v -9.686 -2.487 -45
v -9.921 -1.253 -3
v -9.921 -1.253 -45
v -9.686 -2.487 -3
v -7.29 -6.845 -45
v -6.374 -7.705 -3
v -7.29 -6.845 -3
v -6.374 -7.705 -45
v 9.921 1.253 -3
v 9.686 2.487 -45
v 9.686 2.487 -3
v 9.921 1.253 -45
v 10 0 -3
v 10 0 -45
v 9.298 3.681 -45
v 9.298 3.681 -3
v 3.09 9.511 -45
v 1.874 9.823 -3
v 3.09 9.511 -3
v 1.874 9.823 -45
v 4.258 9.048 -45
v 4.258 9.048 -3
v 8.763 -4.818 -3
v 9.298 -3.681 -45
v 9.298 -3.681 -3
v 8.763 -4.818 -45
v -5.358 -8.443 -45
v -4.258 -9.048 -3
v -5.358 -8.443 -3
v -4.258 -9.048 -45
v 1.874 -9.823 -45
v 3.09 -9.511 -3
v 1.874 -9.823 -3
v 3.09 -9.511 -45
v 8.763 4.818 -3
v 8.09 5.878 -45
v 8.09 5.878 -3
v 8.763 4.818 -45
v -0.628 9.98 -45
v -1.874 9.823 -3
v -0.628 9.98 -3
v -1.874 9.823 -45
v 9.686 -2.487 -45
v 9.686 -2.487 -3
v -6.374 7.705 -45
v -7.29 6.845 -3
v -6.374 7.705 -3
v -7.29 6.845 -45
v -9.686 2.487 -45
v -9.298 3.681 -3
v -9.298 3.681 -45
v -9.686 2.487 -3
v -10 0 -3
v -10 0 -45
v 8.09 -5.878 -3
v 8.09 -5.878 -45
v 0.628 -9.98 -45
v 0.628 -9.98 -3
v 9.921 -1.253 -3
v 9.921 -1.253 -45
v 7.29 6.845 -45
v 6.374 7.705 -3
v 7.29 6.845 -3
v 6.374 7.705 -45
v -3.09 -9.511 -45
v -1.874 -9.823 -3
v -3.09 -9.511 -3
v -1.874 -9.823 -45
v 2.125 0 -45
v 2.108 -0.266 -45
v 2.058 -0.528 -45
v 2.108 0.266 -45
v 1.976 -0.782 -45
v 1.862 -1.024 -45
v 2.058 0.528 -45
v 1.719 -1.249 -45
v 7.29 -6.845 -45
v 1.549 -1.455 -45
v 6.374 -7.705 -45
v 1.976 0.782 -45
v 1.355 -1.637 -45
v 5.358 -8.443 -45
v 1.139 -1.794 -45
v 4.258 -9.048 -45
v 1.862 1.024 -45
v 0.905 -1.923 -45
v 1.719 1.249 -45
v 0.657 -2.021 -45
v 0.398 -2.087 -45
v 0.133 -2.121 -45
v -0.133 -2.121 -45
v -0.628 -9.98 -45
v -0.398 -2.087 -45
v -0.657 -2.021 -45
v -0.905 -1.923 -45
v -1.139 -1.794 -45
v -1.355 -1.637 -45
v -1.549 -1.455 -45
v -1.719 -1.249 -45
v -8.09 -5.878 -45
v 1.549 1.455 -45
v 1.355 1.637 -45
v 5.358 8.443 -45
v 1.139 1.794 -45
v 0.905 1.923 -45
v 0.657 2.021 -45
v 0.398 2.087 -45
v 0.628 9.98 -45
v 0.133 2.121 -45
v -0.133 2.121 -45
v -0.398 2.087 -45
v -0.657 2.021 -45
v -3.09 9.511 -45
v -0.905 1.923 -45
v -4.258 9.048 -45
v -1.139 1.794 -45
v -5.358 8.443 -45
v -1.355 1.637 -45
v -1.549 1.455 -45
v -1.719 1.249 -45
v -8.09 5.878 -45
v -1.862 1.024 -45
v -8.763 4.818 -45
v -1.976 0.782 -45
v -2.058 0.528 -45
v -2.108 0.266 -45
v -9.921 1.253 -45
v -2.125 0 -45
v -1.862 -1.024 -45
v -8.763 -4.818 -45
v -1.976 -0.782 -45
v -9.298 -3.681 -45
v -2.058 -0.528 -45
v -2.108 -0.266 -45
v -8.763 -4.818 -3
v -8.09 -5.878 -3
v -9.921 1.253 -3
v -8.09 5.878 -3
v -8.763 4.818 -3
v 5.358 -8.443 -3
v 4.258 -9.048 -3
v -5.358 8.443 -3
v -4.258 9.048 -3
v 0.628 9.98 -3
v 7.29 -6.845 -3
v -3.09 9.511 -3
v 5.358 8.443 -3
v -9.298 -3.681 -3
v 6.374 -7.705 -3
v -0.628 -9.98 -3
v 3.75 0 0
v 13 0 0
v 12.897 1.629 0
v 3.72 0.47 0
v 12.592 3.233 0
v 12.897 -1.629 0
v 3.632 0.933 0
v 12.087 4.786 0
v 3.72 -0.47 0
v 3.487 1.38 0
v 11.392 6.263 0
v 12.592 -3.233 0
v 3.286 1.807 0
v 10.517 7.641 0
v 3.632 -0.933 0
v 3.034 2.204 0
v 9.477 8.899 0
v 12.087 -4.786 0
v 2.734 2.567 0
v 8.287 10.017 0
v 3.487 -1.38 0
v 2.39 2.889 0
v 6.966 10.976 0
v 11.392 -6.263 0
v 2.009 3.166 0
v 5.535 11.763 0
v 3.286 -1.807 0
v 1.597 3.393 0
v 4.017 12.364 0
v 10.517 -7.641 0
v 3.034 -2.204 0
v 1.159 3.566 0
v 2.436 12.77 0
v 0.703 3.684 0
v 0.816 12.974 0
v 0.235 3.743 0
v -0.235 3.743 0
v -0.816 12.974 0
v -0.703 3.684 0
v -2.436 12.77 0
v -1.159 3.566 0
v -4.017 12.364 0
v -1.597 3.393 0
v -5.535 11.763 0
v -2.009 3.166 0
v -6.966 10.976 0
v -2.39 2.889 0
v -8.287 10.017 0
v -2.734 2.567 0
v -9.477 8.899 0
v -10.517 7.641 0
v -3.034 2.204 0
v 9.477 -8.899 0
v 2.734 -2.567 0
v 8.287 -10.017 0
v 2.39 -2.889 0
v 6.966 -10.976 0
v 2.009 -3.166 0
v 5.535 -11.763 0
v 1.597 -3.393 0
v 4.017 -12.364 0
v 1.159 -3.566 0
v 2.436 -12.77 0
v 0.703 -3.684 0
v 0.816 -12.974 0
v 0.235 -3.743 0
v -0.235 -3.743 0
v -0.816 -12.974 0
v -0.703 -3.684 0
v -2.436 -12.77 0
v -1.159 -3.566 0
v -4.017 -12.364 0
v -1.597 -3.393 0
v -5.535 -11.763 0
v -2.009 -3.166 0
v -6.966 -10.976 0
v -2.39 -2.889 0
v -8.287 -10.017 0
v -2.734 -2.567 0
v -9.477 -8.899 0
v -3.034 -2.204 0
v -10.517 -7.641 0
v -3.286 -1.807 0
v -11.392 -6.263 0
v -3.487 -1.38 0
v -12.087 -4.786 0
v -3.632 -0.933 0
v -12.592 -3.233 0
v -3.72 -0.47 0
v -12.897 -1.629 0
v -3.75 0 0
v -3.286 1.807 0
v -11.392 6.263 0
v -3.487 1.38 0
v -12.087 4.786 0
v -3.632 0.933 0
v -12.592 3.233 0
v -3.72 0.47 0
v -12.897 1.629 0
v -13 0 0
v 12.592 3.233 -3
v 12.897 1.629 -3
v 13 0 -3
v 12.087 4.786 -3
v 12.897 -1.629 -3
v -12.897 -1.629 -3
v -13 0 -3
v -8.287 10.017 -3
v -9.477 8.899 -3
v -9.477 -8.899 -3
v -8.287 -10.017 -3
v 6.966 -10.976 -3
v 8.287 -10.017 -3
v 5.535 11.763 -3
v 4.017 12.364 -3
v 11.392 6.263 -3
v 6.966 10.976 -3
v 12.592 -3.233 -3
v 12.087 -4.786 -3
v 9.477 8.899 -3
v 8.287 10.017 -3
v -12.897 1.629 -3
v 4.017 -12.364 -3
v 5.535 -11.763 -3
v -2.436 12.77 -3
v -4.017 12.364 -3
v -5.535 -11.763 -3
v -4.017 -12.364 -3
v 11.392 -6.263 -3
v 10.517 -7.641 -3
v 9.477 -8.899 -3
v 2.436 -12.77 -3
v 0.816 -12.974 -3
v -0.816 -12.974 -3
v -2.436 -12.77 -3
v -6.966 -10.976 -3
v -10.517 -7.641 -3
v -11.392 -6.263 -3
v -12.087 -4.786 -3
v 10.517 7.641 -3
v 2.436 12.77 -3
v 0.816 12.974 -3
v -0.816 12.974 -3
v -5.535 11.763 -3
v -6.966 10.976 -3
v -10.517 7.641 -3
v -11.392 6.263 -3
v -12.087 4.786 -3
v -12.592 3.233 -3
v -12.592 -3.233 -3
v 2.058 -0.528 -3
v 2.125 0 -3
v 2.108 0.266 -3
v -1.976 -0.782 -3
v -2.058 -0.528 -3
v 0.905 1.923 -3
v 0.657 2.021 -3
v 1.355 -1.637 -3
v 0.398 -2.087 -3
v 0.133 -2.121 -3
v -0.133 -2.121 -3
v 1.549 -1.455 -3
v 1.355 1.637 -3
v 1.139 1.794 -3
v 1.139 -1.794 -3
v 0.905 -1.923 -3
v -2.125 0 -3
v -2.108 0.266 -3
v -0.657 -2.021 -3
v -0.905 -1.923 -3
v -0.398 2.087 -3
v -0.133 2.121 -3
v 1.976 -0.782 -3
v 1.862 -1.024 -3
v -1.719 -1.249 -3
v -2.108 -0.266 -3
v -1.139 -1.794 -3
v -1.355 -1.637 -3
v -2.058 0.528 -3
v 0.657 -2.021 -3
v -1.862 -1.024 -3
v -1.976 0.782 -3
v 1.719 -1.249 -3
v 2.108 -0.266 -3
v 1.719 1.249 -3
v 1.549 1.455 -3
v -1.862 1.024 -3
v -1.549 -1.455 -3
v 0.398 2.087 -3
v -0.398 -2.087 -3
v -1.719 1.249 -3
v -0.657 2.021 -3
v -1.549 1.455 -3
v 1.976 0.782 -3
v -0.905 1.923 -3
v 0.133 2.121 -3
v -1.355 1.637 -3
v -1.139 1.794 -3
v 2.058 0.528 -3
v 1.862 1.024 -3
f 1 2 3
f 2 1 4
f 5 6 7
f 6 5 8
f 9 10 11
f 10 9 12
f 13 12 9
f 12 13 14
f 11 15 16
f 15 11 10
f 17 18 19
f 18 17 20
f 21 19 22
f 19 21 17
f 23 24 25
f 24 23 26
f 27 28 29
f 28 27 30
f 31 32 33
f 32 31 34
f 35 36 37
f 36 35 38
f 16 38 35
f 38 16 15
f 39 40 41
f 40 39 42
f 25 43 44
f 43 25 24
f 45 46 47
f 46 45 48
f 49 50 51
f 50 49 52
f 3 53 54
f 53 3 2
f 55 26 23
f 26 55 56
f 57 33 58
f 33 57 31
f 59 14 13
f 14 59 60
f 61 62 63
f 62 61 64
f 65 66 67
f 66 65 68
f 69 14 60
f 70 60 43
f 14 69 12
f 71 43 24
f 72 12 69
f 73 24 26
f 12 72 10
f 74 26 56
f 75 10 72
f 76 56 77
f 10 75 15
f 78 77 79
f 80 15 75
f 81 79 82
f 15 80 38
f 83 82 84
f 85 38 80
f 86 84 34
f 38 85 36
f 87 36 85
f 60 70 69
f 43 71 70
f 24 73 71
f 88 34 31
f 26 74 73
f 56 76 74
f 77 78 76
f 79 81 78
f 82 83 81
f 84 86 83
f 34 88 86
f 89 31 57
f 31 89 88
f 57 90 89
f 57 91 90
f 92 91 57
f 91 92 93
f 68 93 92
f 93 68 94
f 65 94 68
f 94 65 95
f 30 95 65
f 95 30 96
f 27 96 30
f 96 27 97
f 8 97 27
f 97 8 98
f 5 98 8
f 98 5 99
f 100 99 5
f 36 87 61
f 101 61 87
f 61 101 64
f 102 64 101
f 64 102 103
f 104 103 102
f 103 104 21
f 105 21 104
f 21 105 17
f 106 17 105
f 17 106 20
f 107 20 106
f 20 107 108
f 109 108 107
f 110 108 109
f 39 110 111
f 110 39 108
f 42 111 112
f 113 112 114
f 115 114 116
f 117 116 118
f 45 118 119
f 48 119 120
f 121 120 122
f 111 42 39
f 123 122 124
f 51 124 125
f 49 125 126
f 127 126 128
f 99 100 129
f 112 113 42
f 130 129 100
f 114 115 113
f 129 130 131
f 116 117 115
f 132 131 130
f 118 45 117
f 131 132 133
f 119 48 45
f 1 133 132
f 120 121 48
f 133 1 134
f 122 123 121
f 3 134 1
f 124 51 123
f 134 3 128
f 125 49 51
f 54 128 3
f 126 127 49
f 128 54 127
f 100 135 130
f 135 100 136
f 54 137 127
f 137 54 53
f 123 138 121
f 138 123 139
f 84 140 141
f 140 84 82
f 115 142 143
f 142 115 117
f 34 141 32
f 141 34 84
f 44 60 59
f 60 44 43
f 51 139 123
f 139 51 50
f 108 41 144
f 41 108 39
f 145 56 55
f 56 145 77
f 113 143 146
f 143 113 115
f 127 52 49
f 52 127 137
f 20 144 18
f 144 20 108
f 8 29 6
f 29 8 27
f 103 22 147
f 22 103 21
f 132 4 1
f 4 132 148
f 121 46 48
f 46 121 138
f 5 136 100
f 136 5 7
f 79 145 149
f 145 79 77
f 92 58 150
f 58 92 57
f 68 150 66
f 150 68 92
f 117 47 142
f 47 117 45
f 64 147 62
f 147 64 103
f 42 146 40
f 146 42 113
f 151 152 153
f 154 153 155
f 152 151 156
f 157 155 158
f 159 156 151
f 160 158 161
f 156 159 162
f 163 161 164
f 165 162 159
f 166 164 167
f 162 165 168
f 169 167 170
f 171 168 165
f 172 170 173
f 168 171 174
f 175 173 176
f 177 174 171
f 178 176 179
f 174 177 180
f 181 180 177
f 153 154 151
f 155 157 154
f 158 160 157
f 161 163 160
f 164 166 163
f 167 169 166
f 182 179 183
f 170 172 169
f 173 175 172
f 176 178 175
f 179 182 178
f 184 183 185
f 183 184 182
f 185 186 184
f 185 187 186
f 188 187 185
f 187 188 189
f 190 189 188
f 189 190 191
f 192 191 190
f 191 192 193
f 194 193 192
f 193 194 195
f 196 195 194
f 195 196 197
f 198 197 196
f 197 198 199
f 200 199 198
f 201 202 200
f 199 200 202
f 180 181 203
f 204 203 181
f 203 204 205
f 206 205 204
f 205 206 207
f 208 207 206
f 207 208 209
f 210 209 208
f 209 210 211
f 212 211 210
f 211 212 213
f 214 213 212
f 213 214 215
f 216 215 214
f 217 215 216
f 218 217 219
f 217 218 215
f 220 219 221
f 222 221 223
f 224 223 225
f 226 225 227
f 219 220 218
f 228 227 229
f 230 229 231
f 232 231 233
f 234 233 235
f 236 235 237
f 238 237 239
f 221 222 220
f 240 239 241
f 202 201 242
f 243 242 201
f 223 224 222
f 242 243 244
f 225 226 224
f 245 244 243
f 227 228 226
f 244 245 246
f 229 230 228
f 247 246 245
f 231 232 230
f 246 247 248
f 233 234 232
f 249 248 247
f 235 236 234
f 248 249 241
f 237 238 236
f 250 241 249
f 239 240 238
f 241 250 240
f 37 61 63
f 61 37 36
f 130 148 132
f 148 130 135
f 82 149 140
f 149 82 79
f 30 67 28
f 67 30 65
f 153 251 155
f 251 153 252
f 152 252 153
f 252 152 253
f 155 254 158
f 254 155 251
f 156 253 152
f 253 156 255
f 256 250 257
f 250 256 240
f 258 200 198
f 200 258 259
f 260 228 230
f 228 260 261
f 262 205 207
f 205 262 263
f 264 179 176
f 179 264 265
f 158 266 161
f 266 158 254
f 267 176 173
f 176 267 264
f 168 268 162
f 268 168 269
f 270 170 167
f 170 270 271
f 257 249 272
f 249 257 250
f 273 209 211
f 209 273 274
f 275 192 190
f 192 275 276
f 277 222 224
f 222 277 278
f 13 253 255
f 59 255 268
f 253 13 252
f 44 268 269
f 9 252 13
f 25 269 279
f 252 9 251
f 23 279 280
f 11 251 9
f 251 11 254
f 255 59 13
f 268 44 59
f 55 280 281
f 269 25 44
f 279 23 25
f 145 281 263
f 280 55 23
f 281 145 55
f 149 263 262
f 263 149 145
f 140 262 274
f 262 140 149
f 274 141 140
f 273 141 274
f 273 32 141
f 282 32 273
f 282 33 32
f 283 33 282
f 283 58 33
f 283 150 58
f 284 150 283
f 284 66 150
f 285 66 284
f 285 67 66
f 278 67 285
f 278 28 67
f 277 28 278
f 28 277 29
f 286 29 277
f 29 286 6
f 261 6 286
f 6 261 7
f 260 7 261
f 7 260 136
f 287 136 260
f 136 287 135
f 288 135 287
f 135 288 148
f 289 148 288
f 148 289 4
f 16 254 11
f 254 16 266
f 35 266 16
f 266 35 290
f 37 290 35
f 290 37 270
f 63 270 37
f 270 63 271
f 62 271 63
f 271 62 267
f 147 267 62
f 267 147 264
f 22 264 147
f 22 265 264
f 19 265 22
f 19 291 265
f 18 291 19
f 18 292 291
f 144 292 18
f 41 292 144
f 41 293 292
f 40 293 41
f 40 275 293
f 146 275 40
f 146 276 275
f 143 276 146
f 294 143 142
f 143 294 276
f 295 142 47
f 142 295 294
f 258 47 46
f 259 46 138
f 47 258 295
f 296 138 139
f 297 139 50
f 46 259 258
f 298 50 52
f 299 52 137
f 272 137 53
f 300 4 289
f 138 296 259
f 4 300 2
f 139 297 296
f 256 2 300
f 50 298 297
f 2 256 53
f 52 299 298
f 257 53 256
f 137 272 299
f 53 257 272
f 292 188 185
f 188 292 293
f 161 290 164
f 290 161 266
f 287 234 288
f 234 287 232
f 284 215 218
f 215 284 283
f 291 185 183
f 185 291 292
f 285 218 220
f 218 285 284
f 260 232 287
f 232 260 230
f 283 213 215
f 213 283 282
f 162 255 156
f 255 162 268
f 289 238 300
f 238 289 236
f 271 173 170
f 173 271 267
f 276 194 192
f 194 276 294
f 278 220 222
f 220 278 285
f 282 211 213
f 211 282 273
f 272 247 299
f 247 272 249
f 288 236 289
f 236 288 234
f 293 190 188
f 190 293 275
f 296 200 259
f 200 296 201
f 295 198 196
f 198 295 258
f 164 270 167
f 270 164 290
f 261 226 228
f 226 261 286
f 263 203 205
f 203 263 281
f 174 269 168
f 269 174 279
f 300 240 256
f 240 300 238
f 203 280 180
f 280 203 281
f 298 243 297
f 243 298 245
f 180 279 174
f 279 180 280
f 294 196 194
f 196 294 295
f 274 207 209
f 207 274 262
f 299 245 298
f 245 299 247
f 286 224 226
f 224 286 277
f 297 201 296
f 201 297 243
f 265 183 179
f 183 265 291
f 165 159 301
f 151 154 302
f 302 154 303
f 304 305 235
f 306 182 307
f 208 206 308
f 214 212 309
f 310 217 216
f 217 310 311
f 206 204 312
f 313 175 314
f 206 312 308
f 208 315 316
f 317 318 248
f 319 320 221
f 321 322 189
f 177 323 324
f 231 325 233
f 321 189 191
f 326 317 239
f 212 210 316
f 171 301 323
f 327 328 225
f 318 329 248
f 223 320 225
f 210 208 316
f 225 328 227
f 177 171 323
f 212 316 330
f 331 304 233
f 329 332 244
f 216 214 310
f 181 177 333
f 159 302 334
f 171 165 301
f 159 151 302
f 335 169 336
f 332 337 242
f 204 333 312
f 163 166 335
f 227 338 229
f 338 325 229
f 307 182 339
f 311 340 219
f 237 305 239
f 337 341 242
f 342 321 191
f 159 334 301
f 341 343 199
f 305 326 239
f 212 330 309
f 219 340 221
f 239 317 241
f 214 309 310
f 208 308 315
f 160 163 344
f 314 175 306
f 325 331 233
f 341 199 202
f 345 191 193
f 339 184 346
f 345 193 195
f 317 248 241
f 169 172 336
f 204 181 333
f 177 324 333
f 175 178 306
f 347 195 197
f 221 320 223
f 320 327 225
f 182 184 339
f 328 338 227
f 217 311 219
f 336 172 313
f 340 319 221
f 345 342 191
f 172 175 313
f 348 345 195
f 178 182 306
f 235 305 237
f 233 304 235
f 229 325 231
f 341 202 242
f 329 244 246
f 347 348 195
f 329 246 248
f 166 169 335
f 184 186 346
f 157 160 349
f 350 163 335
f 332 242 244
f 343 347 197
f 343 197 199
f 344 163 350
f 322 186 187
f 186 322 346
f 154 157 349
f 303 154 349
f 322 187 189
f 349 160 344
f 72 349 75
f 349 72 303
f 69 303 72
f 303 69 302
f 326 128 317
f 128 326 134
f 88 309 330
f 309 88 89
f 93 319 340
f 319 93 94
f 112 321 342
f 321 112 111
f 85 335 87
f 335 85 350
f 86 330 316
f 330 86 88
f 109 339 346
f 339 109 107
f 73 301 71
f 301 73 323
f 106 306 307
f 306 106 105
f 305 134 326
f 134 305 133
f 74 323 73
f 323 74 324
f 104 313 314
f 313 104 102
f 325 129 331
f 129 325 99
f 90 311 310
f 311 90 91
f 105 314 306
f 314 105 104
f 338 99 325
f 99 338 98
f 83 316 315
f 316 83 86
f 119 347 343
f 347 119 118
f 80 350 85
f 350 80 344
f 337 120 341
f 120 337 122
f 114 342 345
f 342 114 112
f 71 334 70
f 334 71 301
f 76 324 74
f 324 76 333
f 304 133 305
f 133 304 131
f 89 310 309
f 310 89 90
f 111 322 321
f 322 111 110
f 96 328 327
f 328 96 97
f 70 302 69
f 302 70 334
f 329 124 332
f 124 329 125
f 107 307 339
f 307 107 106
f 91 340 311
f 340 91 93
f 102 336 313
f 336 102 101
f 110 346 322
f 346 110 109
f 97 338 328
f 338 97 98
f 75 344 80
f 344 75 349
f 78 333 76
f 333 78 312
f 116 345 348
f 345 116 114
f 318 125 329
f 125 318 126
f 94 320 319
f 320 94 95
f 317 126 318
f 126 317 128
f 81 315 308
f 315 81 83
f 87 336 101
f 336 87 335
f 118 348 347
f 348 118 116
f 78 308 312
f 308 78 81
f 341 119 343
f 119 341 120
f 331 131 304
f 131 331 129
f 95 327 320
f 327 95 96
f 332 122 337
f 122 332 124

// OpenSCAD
$fn = 50;


difference() {
	union() {
		translate(v = [0, 0, -45.0000000000]) {
			cylinder(h = 45, r = 10.0000000000);
		}
		translate(v = [0, 0, -3.0000000000]) {
			cylinder(h = 3, r = 13.0000000000);
		}
	}
	union() {
		translate(v = [0, 0, 0]) {
			rotate(a = [0, 0, 0]) {
				difference() {
					union() {
						#translate(v = [0, 0, -45.0000000000]) {
							cylinder(h = 45, r = 2.0000000000);
						}
						#translate(v = [0, 0, -3]) {
							cylinder(h = 3, r1 = 2.1250000000, r2 = 3.7500000000);
						}
						#translate(v = [0, 0, -45.0000000000]) {
							cylinder(h = 45, r = 2.1250000000);
						}
						#translate(v = [0, 0, -45.0000000000]) {
							cylinder(h = 45, r = 2.0000000000);
						}
					}
					union();
				}
			}
		}
	}
}
